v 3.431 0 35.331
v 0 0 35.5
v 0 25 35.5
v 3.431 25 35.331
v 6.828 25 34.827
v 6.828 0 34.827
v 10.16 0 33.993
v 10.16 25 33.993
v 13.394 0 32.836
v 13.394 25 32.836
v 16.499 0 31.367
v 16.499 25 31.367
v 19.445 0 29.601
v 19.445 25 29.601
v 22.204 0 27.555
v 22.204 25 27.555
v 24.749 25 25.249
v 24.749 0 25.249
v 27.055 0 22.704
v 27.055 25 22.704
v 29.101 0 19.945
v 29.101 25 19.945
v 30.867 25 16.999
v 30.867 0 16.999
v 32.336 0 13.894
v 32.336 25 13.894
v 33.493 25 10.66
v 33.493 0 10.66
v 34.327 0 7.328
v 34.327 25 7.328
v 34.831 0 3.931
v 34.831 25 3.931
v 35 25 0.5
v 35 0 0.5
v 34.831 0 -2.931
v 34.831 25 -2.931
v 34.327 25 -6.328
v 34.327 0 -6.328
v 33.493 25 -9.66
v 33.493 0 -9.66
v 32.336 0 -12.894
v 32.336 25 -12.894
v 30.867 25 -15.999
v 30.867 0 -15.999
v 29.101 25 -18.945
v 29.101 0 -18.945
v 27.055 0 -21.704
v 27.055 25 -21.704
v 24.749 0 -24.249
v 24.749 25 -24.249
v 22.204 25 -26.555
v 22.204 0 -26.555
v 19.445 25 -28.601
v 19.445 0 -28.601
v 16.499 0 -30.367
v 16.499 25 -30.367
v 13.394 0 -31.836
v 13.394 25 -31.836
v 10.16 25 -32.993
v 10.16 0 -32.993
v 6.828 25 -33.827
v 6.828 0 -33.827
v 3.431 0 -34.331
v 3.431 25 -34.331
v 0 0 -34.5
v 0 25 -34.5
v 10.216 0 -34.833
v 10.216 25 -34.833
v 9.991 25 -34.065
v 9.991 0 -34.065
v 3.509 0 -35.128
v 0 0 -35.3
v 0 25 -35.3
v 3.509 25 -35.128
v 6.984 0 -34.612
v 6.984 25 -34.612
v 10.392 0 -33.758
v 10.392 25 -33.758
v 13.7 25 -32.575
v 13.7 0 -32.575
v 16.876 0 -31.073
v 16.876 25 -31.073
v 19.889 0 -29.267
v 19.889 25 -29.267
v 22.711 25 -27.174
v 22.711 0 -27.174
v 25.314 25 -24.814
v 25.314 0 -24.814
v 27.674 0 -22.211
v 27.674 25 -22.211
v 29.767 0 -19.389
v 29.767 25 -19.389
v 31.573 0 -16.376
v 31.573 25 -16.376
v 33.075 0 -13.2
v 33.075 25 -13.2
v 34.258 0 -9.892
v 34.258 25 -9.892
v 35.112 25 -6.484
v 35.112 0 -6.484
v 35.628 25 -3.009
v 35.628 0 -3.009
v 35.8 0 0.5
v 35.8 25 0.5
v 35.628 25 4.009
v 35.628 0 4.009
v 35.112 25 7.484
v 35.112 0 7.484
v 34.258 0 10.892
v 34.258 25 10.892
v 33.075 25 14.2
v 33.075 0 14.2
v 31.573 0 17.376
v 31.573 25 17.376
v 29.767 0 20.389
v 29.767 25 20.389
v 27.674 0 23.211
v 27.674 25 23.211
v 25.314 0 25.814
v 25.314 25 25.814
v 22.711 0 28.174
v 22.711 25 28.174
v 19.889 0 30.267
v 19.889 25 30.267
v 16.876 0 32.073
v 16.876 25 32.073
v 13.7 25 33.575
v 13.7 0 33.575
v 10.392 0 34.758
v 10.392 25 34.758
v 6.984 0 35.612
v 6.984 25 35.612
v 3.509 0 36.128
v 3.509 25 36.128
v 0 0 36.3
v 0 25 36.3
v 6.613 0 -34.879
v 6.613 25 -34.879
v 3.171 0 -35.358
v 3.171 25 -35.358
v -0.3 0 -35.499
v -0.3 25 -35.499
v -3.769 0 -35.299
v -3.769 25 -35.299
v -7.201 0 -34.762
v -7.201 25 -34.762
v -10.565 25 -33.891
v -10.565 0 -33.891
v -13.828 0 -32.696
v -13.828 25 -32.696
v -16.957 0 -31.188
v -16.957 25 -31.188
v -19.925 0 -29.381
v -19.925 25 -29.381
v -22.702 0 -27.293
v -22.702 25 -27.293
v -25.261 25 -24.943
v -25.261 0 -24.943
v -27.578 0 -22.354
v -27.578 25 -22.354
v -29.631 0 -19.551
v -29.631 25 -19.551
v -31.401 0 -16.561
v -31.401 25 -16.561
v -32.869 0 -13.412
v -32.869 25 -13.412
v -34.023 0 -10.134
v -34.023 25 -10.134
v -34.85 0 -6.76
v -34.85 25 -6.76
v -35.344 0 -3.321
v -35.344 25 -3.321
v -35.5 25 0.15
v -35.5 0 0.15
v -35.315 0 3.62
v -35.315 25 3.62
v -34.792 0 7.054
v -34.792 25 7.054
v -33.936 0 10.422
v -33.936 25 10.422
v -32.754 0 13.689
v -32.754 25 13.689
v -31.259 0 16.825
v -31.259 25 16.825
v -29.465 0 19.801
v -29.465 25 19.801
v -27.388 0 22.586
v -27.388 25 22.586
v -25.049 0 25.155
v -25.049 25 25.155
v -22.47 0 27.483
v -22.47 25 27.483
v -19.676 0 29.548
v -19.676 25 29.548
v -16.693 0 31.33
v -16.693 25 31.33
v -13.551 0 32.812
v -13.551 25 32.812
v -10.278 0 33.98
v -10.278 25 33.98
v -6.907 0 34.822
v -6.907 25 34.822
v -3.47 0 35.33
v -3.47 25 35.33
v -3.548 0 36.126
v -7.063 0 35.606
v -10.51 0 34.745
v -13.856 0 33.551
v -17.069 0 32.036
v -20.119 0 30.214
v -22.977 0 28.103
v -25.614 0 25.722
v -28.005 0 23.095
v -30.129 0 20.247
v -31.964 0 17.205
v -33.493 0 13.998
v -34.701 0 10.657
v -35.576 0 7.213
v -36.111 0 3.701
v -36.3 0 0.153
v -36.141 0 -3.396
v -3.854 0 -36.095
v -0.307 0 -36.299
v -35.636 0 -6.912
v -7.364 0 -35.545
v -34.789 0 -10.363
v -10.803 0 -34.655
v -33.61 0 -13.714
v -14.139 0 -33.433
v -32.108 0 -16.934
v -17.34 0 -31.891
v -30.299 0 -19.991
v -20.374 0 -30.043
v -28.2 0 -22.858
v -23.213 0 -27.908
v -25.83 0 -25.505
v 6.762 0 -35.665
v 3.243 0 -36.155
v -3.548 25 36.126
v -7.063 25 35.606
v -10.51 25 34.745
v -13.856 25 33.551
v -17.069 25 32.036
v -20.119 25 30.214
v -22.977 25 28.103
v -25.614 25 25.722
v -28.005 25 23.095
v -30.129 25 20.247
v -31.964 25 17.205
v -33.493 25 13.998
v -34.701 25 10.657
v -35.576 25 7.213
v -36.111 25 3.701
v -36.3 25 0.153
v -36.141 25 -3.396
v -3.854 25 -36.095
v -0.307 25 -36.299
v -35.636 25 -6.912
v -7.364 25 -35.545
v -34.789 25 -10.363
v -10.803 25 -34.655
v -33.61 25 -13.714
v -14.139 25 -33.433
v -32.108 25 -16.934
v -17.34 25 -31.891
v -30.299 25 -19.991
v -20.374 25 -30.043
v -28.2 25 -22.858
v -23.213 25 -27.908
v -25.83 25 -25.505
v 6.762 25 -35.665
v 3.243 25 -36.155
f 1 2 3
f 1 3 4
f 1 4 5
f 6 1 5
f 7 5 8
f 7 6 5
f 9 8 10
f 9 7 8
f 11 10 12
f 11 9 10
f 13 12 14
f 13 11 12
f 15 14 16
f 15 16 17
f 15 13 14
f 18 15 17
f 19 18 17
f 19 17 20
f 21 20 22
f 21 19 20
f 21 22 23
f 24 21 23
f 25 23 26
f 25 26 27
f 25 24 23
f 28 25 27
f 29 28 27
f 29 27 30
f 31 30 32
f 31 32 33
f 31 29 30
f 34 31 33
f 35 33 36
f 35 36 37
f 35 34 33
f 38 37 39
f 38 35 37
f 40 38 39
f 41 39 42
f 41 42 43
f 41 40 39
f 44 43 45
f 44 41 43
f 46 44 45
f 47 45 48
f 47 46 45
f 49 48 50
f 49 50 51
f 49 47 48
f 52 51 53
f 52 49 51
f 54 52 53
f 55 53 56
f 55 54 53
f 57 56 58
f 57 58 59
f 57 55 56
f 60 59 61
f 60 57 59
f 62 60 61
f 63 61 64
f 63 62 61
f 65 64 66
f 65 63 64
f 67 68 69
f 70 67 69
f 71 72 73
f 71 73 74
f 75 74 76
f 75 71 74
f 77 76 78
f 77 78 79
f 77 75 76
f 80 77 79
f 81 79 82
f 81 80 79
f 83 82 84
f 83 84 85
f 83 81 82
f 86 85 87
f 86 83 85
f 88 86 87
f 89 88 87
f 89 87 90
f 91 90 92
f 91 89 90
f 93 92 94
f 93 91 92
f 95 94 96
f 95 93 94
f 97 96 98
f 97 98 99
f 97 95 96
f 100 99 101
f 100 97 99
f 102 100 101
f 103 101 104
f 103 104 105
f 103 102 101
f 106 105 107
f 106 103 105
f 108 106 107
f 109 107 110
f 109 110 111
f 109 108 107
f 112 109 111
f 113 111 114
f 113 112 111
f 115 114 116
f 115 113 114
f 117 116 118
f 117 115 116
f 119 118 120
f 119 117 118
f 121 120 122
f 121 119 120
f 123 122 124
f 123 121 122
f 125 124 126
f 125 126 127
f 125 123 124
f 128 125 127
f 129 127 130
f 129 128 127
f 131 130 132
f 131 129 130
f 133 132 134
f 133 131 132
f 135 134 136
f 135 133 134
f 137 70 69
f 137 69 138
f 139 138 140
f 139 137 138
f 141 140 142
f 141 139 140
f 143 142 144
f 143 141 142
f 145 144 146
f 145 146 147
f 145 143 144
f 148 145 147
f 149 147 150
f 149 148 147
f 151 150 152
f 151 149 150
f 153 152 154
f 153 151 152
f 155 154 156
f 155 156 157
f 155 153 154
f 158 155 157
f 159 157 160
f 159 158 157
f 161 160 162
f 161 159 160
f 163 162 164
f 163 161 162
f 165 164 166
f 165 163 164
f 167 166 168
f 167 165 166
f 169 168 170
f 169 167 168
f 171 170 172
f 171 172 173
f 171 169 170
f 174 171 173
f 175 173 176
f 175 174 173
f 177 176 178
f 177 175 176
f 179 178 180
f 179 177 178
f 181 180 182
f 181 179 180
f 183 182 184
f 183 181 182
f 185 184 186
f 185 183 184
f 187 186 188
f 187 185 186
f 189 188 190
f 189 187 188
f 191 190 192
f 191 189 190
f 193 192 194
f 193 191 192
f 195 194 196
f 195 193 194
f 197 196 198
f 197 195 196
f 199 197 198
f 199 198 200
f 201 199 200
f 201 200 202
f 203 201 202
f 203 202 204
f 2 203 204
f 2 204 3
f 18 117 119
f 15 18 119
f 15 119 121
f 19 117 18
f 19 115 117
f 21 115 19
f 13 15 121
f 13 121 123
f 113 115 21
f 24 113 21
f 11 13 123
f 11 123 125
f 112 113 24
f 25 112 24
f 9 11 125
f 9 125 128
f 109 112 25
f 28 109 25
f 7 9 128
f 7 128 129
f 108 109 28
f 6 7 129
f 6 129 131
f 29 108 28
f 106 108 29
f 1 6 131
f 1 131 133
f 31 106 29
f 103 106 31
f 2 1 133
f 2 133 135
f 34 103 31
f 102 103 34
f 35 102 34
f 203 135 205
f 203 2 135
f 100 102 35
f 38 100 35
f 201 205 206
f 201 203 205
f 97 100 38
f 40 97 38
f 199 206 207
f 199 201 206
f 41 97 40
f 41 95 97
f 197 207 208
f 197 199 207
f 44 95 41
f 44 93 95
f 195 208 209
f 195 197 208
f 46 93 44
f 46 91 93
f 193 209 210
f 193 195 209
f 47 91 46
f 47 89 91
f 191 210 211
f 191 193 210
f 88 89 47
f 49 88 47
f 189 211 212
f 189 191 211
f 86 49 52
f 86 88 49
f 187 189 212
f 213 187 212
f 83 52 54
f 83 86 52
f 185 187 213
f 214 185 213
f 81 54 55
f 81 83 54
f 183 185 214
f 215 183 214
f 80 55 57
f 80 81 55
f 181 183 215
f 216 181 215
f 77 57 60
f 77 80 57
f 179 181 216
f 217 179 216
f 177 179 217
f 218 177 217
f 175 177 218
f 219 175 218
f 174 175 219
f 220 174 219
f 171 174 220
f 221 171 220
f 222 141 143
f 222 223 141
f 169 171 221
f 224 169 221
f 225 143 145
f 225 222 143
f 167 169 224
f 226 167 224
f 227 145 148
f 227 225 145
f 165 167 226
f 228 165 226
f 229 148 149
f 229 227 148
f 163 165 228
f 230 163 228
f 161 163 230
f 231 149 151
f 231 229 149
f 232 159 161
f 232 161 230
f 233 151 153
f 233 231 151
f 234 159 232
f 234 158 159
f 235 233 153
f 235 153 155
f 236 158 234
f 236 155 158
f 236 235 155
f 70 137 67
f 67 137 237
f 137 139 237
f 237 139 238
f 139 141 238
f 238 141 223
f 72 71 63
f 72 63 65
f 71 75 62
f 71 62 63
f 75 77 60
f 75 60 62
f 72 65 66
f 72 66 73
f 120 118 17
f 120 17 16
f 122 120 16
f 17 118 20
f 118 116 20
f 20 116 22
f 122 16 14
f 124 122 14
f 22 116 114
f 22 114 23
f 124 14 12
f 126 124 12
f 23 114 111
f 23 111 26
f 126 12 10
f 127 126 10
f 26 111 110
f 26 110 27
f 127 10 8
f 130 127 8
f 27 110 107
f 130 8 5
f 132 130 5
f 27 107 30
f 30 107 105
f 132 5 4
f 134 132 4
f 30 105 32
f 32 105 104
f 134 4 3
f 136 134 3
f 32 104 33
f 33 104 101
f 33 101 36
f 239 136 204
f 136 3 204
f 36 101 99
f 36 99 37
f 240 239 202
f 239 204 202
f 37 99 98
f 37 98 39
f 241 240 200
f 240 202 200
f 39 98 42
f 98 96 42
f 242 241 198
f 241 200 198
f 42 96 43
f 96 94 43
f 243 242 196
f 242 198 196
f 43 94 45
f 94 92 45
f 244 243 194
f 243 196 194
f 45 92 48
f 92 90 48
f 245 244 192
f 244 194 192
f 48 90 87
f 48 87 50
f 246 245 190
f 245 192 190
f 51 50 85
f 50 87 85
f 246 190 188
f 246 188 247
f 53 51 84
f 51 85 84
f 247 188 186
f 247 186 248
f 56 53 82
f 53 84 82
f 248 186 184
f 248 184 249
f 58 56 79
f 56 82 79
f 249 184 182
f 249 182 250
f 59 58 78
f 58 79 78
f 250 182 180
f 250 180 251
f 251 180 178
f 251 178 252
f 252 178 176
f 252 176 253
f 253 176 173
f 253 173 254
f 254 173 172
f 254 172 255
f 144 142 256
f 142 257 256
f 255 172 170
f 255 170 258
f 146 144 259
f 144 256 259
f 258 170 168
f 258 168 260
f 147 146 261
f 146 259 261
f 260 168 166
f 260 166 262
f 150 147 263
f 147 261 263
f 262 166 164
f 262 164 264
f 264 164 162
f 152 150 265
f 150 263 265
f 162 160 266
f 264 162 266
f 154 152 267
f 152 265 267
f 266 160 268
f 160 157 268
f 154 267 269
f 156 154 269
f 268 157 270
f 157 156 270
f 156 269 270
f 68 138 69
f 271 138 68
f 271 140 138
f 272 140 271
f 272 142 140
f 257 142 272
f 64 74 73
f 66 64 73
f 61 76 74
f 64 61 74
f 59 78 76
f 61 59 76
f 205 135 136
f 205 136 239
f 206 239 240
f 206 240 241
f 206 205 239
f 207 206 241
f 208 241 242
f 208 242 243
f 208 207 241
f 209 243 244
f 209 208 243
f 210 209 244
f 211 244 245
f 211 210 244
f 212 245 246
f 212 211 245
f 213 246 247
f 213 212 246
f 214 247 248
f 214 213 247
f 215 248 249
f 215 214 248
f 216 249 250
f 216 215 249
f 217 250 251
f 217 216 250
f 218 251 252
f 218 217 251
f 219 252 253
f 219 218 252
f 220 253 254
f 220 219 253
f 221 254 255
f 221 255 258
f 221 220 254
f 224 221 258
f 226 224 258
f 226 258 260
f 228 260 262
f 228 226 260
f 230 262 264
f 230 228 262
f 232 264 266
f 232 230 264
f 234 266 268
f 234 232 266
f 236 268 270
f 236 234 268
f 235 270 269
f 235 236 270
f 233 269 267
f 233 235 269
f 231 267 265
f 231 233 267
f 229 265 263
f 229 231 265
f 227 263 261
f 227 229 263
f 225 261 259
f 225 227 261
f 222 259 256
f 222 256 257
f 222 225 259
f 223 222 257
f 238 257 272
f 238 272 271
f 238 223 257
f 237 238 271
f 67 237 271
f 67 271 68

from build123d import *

# Parameters (mm, degrees)
BRIDA_BASE1_DEPTH = 25


# Sheet-metal steps are written as plain solids
with BuildPart() as part:
    # Croquis1 → Brida base1 (new body)
    with BuildSketch(Plane(origin=(0, 0, 0), x_dir=(1, 0, 0), z_dir=(0, 1, 0))):
        with BuildLine():
            ThreePointArc((9.990543733, 34.065217391), (-35.139473654, 5.046522694), (0, -35.5))
            ThreePointArc((0, -35.5), (35, -0.5), (0, 34.5))
            Line((0, 34.5), (0, 35.3))
            ThreePointArc((0, 35.3), (35.8, -0.5), (0, -36.3))
            ThreePointArc((0, -36.3), (-35.931349117, 5.160247149), (10.215682747, 34.832884262))
            Line((10.215682747, 34.832884262), (9.990543733, 34.065217391))
        make_face()
    extrude(amount=BRIDA_BASE1_DEPTH)


solid = part.part
